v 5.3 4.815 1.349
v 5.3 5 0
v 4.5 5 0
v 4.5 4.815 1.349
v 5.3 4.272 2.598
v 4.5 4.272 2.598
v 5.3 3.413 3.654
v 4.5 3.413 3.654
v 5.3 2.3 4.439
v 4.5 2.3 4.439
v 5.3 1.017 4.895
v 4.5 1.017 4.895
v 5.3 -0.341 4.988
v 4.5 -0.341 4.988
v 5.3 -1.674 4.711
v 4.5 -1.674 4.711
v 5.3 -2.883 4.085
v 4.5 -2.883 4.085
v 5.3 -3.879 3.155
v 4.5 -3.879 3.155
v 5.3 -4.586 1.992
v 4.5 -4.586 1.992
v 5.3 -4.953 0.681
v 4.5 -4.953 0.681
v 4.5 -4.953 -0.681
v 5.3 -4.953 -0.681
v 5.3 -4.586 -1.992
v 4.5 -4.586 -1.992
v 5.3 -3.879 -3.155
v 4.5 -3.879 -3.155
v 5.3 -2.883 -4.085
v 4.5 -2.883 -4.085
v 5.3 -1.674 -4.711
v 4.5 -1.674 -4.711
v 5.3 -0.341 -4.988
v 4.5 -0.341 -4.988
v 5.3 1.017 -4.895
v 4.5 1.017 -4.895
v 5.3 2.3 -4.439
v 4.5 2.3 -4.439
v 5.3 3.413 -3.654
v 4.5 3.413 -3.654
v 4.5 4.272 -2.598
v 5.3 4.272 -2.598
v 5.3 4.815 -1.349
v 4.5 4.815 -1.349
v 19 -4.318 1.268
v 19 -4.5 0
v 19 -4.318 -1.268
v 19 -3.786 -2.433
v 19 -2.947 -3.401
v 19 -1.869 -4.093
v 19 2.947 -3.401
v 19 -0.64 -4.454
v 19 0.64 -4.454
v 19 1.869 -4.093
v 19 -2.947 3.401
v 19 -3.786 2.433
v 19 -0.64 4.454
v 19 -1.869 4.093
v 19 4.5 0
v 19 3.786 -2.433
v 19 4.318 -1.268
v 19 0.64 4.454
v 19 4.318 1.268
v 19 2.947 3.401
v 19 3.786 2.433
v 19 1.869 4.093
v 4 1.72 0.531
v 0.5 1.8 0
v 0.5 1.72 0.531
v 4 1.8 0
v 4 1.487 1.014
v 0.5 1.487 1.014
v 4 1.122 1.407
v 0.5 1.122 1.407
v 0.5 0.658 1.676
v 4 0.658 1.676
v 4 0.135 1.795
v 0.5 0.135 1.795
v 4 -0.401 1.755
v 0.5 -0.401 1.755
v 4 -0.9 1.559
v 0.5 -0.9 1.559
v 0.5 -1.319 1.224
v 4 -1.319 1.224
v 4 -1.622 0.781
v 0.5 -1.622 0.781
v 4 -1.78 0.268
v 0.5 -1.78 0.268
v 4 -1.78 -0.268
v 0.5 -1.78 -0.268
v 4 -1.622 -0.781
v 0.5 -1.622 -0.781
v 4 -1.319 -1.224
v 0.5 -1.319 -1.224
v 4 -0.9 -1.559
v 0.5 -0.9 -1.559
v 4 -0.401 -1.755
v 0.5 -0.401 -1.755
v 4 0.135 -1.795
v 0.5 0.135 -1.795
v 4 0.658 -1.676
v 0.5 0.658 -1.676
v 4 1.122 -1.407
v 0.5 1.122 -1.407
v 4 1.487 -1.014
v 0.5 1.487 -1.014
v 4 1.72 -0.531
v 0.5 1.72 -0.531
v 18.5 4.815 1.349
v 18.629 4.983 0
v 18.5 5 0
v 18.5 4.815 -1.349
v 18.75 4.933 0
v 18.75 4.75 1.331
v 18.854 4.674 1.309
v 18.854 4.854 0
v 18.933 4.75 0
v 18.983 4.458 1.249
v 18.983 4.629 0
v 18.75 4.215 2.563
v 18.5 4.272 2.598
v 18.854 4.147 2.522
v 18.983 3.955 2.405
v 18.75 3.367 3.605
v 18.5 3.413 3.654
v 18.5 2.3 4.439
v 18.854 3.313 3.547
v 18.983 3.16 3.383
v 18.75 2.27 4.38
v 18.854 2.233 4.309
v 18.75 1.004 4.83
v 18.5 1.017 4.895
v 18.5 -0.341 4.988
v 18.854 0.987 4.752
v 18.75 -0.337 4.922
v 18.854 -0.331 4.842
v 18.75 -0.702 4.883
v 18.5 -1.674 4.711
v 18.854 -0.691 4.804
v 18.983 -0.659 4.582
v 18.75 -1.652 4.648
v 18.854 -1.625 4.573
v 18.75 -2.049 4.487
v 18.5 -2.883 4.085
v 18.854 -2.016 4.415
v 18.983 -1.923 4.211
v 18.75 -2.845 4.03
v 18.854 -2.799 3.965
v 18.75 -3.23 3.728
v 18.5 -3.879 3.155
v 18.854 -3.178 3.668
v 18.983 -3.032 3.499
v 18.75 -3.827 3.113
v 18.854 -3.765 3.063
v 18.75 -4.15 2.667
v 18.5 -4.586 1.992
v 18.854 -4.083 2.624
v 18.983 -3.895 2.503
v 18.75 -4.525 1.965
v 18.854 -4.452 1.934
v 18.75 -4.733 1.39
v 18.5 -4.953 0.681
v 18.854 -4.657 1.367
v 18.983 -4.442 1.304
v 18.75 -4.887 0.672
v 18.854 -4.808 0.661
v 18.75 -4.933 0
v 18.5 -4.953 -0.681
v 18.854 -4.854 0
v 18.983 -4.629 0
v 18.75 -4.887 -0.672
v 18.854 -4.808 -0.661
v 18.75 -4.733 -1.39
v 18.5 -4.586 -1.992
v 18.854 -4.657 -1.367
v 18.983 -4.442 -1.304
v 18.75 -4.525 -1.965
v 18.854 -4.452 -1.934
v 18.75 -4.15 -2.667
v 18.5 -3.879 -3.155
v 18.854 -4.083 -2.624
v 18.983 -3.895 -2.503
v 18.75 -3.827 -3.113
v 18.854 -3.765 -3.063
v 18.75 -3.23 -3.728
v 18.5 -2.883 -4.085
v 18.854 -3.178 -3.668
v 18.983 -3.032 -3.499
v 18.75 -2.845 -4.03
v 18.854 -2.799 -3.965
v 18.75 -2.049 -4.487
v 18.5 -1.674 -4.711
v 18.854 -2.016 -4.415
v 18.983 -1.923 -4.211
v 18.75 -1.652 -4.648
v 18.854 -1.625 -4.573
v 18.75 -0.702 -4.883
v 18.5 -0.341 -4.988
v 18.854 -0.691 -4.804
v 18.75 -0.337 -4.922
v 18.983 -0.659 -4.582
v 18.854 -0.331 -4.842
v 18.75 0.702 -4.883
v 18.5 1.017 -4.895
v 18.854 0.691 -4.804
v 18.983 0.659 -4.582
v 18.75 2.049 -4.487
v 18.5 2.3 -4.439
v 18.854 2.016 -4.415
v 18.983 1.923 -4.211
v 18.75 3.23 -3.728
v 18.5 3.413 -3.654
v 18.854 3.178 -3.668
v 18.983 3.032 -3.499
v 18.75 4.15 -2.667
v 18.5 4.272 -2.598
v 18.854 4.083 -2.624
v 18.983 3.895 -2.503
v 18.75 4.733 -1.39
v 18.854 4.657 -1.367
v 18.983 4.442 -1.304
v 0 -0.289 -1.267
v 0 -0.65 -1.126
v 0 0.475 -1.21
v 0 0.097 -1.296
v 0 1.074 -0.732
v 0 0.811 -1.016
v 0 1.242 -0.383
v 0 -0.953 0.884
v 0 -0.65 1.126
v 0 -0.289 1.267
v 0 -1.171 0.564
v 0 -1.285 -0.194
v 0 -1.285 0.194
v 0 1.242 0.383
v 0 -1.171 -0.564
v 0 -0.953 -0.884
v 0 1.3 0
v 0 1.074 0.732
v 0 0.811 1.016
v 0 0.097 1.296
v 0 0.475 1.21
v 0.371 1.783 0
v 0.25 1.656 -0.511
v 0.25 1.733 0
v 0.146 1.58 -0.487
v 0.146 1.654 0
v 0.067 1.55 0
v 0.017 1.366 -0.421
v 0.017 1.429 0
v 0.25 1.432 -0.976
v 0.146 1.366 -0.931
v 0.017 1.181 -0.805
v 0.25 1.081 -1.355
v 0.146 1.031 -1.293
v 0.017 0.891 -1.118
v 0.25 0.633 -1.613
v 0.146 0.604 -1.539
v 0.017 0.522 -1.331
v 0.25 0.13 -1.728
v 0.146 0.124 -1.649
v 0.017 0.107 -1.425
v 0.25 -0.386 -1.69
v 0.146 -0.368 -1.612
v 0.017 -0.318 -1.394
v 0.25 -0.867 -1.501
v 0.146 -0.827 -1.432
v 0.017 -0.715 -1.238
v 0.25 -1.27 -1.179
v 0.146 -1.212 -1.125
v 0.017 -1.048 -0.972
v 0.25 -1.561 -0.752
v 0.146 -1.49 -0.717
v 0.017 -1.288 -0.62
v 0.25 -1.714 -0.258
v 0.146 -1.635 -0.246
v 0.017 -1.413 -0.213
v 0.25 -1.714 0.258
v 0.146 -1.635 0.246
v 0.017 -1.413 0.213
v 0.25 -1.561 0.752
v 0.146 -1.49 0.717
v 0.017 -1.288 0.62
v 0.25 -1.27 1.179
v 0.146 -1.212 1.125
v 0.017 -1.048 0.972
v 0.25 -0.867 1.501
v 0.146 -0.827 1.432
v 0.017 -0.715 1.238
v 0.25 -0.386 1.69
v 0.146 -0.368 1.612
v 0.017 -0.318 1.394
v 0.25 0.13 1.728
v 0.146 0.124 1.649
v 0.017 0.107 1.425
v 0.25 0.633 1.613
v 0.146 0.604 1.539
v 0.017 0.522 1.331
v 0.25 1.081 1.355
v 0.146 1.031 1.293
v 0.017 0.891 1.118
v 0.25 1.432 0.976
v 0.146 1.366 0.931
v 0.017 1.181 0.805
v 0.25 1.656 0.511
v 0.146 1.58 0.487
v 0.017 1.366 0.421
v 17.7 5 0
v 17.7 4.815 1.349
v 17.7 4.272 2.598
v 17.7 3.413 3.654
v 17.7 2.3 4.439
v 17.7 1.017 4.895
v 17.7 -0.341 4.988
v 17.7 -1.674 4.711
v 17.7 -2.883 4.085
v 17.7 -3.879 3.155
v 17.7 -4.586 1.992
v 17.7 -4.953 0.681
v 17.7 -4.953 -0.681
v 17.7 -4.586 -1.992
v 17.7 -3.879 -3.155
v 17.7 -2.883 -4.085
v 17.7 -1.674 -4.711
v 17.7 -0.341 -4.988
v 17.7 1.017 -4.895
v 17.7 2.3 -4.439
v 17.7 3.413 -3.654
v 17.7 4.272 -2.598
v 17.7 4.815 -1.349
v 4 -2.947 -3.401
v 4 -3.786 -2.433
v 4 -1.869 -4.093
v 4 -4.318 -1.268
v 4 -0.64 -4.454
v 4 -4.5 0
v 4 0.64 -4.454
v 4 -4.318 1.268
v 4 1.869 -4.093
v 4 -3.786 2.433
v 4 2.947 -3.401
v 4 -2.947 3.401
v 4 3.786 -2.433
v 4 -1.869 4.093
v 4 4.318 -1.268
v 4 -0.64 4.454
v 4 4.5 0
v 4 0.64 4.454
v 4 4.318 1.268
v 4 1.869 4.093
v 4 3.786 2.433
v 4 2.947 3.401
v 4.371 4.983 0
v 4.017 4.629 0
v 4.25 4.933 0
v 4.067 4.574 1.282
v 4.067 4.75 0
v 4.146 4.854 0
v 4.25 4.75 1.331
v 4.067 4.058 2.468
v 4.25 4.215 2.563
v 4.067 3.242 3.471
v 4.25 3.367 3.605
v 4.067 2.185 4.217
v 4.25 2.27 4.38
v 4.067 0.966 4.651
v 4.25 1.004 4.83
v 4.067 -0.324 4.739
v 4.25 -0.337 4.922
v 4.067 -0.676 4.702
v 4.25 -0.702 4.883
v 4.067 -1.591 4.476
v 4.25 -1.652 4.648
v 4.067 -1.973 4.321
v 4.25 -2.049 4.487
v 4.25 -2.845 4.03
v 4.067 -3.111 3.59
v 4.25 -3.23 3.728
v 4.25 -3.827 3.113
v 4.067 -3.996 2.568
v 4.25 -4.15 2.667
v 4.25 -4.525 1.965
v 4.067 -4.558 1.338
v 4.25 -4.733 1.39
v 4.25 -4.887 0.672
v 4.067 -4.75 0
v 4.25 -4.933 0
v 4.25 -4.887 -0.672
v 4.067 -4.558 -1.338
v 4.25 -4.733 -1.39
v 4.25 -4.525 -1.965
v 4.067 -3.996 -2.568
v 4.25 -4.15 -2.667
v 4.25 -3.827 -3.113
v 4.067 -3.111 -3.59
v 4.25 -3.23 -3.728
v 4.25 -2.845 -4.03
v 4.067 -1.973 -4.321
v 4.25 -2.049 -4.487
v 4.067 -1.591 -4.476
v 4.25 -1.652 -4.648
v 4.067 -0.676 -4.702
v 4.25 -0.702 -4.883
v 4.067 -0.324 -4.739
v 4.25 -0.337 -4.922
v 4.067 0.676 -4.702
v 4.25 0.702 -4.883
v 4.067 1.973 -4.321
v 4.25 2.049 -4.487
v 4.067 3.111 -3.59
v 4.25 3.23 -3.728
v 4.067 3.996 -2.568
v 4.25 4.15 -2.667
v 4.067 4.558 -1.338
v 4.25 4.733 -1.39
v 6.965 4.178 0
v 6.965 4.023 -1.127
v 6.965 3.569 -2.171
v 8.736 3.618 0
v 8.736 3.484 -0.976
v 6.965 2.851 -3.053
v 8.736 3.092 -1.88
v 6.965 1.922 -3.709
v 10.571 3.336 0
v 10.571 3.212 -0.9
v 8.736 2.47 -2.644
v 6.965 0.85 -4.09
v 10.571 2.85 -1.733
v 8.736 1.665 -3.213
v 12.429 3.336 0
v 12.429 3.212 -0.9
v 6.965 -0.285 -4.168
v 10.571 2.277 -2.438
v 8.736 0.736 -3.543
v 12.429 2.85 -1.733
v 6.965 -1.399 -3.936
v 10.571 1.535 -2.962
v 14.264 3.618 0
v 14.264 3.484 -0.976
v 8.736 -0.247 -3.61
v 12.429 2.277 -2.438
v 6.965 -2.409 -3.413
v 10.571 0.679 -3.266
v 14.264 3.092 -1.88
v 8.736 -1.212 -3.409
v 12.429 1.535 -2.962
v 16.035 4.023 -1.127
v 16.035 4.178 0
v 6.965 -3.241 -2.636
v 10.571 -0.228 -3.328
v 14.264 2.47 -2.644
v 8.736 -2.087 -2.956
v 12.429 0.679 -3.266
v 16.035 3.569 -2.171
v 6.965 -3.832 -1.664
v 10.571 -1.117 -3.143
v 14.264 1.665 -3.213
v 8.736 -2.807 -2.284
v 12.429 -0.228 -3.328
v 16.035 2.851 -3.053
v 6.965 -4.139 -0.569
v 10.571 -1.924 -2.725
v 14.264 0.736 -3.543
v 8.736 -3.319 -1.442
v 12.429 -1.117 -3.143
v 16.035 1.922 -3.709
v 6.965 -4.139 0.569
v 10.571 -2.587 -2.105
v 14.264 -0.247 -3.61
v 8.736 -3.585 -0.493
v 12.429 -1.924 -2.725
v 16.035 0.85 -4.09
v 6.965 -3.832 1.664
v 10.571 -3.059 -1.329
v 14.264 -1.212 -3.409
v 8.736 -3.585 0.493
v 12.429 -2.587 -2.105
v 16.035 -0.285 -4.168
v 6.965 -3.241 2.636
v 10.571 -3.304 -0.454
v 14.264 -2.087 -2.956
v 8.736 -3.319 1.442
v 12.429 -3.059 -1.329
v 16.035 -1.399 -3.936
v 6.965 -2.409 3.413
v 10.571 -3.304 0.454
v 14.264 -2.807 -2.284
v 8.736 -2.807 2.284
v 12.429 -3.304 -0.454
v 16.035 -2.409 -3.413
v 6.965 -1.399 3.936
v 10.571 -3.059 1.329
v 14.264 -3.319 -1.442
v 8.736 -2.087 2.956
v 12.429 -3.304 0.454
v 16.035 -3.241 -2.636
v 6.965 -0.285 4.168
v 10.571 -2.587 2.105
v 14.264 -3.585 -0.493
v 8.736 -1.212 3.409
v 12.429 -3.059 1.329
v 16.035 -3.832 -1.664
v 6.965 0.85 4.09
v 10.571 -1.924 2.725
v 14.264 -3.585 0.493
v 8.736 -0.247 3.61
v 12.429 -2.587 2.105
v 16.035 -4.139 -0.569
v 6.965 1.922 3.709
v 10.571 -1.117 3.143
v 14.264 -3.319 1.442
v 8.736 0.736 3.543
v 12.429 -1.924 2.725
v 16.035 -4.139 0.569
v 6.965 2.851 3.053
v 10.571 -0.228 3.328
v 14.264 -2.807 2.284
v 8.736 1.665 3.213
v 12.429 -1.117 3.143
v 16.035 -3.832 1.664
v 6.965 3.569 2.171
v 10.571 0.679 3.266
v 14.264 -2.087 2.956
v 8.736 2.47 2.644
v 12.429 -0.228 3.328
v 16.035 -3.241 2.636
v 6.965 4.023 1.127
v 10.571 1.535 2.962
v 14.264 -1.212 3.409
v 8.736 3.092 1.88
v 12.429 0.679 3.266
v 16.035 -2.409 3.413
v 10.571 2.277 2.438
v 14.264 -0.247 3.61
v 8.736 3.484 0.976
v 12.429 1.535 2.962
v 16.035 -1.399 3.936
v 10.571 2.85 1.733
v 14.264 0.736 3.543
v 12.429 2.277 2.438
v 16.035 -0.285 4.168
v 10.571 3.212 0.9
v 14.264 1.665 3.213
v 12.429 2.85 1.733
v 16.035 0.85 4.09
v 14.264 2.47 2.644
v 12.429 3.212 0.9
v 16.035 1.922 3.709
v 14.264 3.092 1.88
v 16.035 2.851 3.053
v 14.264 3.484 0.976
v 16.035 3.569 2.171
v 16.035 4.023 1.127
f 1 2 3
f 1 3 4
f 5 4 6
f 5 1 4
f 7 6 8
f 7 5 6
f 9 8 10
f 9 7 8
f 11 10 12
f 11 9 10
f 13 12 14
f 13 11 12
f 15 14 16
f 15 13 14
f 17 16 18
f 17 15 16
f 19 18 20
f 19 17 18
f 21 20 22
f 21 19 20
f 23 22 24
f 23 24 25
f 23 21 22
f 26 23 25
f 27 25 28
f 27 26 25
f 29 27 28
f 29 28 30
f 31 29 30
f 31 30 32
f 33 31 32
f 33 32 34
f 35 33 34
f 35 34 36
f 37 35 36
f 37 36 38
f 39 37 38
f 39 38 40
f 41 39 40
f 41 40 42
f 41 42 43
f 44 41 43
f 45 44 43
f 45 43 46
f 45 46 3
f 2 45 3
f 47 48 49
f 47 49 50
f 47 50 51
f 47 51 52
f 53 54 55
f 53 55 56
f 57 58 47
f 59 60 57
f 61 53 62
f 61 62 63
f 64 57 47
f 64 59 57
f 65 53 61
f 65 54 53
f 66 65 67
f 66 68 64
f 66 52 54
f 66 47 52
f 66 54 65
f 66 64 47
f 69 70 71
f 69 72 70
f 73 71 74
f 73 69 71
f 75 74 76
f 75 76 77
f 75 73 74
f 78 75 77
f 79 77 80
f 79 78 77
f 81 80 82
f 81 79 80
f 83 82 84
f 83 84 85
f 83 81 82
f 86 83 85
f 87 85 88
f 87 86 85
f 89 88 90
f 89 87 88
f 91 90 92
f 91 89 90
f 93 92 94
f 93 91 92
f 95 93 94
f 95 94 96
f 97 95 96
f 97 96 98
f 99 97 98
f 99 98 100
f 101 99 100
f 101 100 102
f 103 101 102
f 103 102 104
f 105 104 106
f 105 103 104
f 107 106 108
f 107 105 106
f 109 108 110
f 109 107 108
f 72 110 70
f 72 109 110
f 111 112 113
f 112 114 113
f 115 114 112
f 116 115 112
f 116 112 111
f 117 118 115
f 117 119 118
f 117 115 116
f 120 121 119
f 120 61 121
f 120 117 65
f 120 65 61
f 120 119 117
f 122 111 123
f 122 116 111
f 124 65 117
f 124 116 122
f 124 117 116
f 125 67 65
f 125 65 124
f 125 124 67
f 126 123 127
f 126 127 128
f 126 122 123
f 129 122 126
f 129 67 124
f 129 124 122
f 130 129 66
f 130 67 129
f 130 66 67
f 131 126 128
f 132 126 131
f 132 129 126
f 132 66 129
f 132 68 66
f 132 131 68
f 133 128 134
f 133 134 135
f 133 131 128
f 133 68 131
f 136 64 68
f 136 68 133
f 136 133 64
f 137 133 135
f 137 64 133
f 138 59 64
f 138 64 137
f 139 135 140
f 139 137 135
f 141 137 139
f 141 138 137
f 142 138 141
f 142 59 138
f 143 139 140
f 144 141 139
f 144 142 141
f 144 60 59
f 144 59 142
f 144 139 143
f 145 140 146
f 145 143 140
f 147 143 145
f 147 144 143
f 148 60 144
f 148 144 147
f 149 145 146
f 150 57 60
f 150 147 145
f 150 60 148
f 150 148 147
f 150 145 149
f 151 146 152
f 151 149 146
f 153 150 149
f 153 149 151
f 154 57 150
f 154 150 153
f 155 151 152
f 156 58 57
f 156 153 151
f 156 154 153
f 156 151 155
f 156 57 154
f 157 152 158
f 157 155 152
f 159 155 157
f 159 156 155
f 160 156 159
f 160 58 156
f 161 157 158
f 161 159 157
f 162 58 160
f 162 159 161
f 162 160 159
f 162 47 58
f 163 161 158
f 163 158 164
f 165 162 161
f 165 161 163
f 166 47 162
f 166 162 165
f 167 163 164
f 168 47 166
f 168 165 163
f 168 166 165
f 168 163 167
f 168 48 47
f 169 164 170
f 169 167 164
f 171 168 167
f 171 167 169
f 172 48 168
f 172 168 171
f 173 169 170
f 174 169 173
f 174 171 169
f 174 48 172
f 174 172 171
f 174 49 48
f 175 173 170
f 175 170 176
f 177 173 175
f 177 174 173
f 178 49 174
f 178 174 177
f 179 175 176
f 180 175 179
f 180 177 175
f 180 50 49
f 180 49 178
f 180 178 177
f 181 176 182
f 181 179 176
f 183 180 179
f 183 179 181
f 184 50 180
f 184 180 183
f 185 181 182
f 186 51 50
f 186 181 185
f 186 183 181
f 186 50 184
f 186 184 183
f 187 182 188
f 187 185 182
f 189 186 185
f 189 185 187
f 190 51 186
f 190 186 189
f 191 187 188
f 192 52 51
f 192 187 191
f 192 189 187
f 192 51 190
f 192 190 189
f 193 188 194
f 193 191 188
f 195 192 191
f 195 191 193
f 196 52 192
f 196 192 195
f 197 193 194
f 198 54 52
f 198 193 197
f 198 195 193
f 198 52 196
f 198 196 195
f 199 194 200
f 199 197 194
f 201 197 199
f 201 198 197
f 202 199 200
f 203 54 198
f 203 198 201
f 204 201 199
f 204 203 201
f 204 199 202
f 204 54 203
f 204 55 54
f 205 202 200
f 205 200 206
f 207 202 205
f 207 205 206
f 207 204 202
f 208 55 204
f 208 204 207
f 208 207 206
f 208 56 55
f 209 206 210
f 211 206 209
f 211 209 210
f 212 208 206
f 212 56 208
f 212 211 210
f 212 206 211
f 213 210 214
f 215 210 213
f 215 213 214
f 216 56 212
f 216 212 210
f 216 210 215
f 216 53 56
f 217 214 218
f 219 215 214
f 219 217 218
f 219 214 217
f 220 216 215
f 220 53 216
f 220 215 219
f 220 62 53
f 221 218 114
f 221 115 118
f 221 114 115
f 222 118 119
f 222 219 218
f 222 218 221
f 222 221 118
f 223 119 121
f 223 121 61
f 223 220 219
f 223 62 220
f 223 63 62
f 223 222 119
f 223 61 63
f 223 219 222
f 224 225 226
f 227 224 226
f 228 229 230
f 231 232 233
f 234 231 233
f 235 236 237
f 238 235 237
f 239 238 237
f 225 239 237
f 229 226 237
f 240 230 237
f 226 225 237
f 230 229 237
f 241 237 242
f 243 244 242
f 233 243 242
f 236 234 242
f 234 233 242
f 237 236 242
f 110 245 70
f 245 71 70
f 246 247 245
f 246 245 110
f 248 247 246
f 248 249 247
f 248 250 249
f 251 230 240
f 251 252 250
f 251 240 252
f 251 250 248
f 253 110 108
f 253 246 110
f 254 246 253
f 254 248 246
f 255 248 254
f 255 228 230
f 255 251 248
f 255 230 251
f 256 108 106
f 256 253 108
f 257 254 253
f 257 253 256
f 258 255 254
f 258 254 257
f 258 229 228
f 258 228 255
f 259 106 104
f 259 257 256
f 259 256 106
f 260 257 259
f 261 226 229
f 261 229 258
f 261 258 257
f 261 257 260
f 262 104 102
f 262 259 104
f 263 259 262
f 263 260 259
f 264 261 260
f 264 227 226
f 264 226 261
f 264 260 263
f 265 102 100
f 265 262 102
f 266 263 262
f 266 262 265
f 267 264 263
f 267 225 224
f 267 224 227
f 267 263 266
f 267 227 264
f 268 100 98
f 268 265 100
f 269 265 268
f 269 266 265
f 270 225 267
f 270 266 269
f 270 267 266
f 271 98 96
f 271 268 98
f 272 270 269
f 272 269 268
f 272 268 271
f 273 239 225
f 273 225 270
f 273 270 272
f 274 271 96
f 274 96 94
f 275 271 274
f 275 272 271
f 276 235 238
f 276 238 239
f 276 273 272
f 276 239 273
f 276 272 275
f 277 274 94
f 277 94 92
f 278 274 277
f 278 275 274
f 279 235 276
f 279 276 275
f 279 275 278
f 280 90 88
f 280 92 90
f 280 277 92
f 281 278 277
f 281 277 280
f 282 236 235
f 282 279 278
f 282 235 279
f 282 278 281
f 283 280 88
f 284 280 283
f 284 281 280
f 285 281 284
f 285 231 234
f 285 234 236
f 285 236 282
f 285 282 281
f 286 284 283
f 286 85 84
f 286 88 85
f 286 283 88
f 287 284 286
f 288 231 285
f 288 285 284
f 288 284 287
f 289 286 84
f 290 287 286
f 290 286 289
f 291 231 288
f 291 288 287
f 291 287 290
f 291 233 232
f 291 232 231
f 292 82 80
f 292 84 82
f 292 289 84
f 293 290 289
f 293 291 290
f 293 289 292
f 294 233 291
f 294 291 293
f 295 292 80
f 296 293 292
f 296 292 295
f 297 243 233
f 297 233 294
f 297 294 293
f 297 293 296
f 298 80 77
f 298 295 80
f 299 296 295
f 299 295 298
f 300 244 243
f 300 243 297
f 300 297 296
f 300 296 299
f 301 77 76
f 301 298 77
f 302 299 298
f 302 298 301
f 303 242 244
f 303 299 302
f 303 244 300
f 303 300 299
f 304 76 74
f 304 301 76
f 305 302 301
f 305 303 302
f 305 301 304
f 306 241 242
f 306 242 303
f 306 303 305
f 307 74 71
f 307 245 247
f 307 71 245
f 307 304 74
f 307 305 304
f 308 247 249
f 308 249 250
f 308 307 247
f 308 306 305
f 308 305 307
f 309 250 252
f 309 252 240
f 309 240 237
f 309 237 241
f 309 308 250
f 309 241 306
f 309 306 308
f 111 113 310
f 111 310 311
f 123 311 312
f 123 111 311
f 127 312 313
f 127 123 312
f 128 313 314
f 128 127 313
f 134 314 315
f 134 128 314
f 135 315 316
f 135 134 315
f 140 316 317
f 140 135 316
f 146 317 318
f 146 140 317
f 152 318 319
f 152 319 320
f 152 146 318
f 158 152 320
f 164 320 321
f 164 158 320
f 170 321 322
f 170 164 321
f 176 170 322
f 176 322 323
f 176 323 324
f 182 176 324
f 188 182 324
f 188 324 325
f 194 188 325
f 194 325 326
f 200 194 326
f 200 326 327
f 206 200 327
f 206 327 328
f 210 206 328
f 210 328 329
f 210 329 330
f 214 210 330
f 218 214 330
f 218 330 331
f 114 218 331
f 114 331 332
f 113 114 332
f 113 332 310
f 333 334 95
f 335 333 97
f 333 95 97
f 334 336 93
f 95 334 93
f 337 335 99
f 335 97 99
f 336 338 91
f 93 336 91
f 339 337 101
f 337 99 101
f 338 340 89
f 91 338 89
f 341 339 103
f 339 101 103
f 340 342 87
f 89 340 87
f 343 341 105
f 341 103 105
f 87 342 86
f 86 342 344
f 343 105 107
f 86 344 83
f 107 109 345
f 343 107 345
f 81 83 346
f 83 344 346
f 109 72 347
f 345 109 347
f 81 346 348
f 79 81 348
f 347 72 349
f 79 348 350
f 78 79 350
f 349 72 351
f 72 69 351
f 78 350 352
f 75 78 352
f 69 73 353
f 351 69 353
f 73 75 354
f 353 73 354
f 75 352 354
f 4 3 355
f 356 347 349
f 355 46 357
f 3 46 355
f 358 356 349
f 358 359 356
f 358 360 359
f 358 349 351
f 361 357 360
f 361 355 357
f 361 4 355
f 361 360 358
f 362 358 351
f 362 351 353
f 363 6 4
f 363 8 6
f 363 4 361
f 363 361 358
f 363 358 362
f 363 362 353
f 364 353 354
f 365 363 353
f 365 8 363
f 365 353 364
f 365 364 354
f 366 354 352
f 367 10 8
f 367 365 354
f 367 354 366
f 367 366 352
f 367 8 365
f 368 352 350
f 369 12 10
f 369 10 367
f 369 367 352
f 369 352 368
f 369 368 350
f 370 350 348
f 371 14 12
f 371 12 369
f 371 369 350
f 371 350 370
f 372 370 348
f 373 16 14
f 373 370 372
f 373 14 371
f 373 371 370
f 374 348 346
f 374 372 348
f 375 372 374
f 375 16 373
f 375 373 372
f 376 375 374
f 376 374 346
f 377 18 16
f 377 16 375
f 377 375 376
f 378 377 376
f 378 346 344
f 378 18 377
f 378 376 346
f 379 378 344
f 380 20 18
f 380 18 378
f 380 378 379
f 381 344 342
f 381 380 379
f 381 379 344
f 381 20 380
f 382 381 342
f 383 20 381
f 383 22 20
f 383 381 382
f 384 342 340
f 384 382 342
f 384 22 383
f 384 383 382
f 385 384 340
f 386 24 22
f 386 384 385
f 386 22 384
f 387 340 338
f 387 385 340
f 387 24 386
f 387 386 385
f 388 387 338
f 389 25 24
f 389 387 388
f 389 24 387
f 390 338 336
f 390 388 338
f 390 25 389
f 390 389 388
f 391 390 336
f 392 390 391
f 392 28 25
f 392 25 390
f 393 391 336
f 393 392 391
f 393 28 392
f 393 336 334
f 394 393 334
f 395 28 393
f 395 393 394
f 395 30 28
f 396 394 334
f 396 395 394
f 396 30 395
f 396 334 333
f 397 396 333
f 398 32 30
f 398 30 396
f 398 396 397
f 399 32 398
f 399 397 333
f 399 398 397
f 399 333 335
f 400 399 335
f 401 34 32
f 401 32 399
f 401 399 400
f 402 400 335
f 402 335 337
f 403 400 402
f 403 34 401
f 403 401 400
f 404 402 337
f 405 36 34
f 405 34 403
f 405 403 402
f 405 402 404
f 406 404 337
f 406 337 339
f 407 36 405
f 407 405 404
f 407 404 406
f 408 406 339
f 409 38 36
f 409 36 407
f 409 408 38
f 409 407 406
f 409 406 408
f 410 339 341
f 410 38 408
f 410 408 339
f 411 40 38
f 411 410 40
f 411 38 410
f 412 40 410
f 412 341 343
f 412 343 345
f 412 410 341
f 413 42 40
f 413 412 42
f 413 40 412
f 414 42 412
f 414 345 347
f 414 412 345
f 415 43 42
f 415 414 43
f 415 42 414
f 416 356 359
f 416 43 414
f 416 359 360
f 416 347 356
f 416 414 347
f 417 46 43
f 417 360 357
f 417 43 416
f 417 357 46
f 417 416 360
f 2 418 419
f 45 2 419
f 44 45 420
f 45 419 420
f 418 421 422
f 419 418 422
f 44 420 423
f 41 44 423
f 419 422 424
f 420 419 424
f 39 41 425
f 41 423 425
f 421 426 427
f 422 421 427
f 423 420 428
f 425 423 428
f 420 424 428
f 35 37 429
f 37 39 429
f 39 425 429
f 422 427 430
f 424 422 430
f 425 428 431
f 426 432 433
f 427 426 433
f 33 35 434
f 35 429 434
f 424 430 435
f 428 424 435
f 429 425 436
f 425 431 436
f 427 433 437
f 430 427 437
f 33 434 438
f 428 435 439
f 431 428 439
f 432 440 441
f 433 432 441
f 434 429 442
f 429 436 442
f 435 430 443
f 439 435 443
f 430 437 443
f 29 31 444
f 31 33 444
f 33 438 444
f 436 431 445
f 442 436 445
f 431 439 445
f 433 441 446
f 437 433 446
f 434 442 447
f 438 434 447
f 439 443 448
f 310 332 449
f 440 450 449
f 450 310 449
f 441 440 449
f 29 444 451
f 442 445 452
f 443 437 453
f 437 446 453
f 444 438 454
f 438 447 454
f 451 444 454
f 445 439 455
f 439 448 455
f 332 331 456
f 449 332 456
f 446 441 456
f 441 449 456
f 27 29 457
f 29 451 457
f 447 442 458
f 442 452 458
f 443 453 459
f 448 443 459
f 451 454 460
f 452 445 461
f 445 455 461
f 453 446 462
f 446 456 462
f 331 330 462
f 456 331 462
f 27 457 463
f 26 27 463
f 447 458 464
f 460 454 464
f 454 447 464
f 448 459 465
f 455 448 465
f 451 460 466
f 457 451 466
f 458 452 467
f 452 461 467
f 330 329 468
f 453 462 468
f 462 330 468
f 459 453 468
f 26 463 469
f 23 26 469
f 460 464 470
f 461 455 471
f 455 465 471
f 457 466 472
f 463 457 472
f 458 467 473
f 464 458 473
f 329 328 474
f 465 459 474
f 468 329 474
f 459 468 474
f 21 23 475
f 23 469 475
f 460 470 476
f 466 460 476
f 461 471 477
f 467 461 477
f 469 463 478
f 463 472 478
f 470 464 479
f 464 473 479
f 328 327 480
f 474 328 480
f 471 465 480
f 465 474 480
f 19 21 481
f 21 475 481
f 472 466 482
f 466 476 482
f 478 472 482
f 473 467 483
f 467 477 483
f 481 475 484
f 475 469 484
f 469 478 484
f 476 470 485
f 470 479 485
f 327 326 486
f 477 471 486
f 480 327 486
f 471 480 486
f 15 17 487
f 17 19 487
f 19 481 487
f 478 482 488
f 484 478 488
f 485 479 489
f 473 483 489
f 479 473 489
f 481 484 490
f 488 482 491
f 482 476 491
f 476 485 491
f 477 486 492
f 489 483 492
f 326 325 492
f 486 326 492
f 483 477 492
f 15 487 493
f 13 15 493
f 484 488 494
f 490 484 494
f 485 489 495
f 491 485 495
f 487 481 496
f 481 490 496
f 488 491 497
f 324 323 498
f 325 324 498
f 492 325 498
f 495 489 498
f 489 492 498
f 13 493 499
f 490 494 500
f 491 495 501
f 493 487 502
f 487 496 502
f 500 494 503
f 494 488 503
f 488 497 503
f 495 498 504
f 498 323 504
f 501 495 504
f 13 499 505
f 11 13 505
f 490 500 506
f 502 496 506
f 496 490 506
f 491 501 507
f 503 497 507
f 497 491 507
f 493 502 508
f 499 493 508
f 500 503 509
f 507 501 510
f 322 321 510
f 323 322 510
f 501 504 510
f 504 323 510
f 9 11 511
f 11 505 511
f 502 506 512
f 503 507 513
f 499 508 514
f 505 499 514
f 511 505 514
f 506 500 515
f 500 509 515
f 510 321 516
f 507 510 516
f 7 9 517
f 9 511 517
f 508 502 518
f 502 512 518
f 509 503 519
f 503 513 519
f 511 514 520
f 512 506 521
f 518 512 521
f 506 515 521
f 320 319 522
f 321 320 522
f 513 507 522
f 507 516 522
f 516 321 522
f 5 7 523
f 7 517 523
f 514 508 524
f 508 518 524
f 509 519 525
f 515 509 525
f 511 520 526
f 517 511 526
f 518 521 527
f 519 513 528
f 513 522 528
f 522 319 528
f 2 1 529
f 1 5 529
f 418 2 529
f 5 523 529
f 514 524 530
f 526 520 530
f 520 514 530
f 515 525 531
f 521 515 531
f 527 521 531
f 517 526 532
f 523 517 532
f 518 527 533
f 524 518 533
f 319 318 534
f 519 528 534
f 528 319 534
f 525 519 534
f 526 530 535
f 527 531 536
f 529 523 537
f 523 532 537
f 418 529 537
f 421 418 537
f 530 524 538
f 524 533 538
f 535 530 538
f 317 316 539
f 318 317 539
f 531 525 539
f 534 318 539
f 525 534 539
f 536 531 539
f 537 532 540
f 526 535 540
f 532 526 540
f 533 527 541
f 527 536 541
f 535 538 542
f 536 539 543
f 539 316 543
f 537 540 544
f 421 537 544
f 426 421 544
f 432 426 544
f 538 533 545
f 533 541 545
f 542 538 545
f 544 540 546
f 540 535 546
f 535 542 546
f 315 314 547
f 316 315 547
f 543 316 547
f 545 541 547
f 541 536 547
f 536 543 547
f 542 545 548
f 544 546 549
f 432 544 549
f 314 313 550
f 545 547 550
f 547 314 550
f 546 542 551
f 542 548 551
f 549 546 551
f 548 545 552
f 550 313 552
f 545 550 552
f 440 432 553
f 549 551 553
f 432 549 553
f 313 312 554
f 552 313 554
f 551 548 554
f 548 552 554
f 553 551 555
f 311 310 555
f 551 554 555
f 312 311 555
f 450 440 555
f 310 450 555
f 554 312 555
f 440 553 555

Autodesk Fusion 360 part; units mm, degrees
sketch "Esquisse1" plane through (0, 0, 0) normal (0, 0, 1) x (1, 0, 0)
  line L0 (0, 0) -> (25, 0) construction
  line L1 (0, 0) -> (0, 1.8)
  line L2 (0, 1.8) -> (4, 1.8)
  line L3 (4, 1.8) -> (4, 5)
  line L4 (4, 5) -> (19, 5)
  line L5 (19, 5) -> (19, 0)
  arc A0 (5.3, 5) -> (17.7, 5) centre (11.5, 15.4559) ccw
  line L6 (0, 0) -> (19, 0)
  line L7 (7.6902, 3.3) -> (16, 3.3) construction
  dimension "d1" = 1.8
  dimension "d2" = 4
  dimension "d3" = 5
  dimension "d4" = 1.3
  dimension "d5" = 1.3
  dimension "d12" = 15
  dimension "d14" = 3.3
revolve "Révolution1" add sketch "Esquisse1" angle 360 about axis through (0, 0, 0) along (1, 0, 0) contours L1 L2 L3 L4 L5 A0 L6
fillet "Congé1" radius 0.5 2 edges at (19, -1.8081, 4.6616) (4, -1.8081, 4.6616)
fillet "Congé2" radius 0.5 1 edges at (0, -0.6509, 1.6782)
